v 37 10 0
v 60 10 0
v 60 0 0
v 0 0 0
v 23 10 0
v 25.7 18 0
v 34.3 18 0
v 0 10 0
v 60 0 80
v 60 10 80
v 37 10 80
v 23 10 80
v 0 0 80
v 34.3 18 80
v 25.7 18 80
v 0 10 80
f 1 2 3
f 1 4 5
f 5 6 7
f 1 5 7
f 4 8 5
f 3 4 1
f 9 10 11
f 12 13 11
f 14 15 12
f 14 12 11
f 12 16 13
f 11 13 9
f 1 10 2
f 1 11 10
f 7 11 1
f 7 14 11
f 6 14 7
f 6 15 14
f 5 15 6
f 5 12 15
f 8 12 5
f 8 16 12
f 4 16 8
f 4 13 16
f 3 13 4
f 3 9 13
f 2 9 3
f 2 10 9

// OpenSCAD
$fn = 32;

// ----------------------------------------------------------------------
// V guide rail: dovetail, 60 mm wide
// ----------------------------------------------------------------------

// --- parameters (mm) ---
rail_w = 60;              // rail width, X
base_t = 10;              // base plate thickness
v_depth = 8;              // V feature depth / height
v_half_w = 7;             // half width of the V at the base face
plate_t = 80;             // rail length, Z (the extrusion height)
top_half_w = 4.3;         // half width at the dovetail top
fit_tol = 0.1;            // declared fit tolerance (prompt contract)
free_tol = 0.5;           // declared free tolerance (prompt contract)

dovetail_base = 2 * v_half_w;  // dovetail width at the base
dovetail_top = 2 * top_half_w;  // dovetail width at the top

profile = [[0, 0], [60, 0], [60, 10], [37, 10], [34.3, 18], [25.7, 18], [23, 10], [0, 10]];  // primary outline, 8 points, counter clockwise

// --- the one profile operation ---
linear_extrude(height = plate_t) polygon(points = profile);
